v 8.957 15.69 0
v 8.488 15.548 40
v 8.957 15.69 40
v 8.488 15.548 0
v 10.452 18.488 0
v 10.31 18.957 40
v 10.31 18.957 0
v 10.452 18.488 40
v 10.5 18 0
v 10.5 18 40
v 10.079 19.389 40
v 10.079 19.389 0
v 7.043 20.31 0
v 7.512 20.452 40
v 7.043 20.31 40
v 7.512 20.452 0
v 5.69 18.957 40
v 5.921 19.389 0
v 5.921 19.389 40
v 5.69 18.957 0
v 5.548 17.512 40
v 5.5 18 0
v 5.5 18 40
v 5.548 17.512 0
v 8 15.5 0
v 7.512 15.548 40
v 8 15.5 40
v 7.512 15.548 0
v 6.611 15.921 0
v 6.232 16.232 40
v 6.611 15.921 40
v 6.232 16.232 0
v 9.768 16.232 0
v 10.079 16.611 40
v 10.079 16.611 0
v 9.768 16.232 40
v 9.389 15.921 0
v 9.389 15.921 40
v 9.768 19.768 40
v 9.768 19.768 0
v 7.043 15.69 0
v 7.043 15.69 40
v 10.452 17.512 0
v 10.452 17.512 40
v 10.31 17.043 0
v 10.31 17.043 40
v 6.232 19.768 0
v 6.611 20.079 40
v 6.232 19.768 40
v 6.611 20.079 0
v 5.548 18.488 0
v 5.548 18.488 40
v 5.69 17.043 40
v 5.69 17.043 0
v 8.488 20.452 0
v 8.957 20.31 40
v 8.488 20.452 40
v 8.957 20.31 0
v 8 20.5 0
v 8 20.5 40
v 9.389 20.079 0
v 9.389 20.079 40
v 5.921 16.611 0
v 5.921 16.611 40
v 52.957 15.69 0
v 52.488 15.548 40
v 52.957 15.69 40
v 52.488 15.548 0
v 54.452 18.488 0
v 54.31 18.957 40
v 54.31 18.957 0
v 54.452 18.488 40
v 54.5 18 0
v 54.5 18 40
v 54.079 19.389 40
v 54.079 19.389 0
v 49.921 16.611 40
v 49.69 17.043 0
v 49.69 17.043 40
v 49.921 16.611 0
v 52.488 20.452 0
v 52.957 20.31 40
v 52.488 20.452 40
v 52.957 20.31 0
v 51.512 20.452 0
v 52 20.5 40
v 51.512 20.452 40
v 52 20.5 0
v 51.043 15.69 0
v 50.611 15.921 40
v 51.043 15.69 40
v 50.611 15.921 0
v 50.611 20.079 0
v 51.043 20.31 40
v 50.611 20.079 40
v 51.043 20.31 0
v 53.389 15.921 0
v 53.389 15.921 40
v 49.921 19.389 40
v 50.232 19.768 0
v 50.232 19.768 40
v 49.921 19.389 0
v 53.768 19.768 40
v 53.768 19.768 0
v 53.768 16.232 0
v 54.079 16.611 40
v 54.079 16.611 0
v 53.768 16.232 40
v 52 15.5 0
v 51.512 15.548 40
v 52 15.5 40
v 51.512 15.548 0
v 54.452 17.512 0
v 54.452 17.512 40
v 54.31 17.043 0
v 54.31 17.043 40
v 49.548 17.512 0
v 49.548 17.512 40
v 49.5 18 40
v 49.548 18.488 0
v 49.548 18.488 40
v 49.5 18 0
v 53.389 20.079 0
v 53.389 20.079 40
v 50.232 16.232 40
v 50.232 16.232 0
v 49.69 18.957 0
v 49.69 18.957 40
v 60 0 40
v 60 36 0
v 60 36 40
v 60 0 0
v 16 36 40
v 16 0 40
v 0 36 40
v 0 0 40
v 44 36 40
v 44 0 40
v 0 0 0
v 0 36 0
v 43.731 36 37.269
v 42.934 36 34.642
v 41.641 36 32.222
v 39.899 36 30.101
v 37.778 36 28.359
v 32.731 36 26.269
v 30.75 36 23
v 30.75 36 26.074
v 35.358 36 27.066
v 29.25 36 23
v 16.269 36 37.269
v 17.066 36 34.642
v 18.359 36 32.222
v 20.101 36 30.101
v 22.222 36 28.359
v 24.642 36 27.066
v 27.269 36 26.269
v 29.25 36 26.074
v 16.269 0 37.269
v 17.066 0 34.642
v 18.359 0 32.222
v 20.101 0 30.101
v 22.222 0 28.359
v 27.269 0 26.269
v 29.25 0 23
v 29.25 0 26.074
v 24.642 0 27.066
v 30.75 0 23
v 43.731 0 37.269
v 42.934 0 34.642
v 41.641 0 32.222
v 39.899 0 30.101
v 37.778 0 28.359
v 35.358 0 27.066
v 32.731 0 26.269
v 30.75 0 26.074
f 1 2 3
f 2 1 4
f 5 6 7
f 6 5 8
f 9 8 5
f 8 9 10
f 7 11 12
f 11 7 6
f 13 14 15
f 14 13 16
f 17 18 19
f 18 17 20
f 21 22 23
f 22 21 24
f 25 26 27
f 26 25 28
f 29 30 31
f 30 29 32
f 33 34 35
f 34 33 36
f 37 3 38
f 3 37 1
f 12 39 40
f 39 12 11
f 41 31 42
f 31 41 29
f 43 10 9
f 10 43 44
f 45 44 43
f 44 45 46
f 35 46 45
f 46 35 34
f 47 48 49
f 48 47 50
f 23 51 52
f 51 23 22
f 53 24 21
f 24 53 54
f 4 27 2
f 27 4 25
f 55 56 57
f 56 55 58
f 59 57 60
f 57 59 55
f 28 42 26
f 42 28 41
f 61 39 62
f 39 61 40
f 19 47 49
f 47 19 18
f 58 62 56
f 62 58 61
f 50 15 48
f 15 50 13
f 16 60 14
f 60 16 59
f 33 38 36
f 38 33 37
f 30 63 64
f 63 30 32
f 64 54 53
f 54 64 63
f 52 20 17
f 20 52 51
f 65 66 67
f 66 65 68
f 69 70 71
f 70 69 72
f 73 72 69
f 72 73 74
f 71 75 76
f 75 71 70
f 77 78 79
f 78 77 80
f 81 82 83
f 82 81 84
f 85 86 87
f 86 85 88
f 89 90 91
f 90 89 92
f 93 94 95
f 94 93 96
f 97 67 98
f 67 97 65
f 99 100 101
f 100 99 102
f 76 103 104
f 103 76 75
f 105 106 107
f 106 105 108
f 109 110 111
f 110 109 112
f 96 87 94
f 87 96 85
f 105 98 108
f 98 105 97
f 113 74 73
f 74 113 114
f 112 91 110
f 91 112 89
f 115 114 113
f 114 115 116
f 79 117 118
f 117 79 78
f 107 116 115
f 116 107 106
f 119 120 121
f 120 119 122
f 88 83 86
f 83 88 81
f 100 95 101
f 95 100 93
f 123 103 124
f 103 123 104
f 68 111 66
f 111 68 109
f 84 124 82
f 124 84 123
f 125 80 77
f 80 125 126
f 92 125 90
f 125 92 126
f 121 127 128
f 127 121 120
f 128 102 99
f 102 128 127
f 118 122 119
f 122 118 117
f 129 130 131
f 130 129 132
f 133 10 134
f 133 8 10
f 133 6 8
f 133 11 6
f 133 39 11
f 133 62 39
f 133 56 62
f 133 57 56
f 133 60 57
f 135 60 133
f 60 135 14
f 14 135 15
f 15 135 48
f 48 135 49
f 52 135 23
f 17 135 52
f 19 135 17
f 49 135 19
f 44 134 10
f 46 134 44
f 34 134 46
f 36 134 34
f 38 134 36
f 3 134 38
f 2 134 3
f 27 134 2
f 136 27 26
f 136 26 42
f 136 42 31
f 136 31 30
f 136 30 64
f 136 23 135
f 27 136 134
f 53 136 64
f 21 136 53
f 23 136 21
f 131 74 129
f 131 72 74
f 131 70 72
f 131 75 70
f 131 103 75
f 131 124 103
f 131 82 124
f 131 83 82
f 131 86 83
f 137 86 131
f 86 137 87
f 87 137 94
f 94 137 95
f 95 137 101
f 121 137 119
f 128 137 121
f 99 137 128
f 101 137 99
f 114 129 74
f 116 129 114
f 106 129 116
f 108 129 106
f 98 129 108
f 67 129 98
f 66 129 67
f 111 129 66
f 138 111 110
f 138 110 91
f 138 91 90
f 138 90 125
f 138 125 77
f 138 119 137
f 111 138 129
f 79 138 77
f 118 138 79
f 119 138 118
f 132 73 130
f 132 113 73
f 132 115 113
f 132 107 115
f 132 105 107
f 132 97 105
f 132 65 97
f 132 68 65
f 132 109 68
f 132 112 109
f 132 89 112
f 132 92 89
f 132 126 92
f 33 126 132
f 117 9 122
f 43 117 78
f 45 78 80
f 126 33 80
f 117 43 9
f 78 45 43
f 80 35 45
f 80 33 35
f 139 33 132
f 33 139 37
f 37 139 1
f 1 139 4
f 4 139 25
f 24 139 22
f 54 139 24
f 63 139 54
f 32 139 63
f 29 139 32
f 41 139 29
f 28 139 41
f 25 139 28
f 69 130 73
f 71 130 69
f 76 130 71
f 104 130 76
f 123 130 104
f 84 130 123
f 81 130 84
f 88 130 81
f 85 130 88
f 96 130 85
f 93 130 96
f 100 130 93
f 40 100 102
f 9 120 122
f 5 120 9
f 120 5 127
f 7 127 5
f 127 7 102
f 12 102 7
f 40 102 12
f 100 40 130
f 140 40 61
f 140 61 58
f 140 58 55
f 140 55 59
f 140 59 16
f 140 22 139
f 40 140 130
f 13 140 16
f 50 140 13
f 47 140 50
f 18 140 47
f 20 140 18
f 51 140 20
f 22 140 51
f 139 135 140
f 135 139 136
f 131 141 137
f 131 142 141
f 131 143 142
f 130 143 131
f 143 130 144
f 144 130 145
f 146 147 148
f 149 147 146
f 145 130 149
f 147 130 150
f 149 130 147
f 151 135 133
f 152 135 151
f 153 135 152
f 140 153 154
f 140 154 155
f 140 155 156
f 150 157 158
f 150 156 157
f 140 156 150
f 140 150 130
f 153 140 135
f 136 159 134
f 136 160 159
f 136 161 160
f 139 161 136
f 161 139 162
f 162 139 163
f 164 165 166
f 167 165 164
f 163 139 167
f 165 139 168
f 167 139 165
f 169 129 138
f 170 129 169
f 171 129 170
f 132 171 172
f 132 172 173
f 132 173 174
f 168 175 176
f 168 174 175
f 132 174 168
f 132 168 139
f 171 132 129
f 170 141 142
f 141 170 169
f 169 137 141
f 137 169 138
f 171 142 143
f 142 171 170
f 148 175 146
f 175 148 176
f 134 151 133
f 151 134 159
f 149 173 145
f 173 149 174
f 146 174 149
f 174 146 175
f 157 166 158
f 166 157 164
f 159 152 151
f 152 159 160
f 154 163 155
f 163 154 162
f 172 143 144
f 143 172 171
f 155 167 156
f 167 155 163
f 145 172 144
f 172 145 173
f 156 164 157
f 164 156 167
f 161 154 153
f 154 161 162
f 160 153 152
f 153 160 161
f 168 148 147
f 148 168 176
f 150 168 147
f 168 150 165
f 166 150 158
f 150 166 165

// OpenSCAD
$fn = 32;

// ----------------------------------------------------------------------
// Saddle clamp: split shaft clamp
// ----------------------------------------------------------------------

// --- parameters (mm) ---
blk_l = 60;               // block length, X
blk_w = 36;               // block width, Y
blk_h = 40;               // block height
clamp_r = 14;             // shaft groove radius
hole_r = 2.5;             // bolt hole radius
hole_m = 8;               // bolt hole margin from the ends
saw_w = 1.5;              // saw kerf width

saw_depth = clamp_r + 3;  // saw kerf depth

difference() {
  cube([blk_l, blk_w, blk_h]);
  translate([blk_l / 2, -1, blk_h])
    rotate([-90, 0, 0])
      cylinder(h = blk_w + 2, r = clamp_r);
  for (sx = [0, 1])
    translate([sx ? blk_l - hole_m : hole_m, blk_w / 2, -1])
      cylinder(r = hole_r, h = blk_h + 2);
  translate([blk_l / 2 - saw_w / 2, -1, blk_h - saw_depth])
    cube([saw_w, blk_w + 2, saw_depth + 1]);
}
